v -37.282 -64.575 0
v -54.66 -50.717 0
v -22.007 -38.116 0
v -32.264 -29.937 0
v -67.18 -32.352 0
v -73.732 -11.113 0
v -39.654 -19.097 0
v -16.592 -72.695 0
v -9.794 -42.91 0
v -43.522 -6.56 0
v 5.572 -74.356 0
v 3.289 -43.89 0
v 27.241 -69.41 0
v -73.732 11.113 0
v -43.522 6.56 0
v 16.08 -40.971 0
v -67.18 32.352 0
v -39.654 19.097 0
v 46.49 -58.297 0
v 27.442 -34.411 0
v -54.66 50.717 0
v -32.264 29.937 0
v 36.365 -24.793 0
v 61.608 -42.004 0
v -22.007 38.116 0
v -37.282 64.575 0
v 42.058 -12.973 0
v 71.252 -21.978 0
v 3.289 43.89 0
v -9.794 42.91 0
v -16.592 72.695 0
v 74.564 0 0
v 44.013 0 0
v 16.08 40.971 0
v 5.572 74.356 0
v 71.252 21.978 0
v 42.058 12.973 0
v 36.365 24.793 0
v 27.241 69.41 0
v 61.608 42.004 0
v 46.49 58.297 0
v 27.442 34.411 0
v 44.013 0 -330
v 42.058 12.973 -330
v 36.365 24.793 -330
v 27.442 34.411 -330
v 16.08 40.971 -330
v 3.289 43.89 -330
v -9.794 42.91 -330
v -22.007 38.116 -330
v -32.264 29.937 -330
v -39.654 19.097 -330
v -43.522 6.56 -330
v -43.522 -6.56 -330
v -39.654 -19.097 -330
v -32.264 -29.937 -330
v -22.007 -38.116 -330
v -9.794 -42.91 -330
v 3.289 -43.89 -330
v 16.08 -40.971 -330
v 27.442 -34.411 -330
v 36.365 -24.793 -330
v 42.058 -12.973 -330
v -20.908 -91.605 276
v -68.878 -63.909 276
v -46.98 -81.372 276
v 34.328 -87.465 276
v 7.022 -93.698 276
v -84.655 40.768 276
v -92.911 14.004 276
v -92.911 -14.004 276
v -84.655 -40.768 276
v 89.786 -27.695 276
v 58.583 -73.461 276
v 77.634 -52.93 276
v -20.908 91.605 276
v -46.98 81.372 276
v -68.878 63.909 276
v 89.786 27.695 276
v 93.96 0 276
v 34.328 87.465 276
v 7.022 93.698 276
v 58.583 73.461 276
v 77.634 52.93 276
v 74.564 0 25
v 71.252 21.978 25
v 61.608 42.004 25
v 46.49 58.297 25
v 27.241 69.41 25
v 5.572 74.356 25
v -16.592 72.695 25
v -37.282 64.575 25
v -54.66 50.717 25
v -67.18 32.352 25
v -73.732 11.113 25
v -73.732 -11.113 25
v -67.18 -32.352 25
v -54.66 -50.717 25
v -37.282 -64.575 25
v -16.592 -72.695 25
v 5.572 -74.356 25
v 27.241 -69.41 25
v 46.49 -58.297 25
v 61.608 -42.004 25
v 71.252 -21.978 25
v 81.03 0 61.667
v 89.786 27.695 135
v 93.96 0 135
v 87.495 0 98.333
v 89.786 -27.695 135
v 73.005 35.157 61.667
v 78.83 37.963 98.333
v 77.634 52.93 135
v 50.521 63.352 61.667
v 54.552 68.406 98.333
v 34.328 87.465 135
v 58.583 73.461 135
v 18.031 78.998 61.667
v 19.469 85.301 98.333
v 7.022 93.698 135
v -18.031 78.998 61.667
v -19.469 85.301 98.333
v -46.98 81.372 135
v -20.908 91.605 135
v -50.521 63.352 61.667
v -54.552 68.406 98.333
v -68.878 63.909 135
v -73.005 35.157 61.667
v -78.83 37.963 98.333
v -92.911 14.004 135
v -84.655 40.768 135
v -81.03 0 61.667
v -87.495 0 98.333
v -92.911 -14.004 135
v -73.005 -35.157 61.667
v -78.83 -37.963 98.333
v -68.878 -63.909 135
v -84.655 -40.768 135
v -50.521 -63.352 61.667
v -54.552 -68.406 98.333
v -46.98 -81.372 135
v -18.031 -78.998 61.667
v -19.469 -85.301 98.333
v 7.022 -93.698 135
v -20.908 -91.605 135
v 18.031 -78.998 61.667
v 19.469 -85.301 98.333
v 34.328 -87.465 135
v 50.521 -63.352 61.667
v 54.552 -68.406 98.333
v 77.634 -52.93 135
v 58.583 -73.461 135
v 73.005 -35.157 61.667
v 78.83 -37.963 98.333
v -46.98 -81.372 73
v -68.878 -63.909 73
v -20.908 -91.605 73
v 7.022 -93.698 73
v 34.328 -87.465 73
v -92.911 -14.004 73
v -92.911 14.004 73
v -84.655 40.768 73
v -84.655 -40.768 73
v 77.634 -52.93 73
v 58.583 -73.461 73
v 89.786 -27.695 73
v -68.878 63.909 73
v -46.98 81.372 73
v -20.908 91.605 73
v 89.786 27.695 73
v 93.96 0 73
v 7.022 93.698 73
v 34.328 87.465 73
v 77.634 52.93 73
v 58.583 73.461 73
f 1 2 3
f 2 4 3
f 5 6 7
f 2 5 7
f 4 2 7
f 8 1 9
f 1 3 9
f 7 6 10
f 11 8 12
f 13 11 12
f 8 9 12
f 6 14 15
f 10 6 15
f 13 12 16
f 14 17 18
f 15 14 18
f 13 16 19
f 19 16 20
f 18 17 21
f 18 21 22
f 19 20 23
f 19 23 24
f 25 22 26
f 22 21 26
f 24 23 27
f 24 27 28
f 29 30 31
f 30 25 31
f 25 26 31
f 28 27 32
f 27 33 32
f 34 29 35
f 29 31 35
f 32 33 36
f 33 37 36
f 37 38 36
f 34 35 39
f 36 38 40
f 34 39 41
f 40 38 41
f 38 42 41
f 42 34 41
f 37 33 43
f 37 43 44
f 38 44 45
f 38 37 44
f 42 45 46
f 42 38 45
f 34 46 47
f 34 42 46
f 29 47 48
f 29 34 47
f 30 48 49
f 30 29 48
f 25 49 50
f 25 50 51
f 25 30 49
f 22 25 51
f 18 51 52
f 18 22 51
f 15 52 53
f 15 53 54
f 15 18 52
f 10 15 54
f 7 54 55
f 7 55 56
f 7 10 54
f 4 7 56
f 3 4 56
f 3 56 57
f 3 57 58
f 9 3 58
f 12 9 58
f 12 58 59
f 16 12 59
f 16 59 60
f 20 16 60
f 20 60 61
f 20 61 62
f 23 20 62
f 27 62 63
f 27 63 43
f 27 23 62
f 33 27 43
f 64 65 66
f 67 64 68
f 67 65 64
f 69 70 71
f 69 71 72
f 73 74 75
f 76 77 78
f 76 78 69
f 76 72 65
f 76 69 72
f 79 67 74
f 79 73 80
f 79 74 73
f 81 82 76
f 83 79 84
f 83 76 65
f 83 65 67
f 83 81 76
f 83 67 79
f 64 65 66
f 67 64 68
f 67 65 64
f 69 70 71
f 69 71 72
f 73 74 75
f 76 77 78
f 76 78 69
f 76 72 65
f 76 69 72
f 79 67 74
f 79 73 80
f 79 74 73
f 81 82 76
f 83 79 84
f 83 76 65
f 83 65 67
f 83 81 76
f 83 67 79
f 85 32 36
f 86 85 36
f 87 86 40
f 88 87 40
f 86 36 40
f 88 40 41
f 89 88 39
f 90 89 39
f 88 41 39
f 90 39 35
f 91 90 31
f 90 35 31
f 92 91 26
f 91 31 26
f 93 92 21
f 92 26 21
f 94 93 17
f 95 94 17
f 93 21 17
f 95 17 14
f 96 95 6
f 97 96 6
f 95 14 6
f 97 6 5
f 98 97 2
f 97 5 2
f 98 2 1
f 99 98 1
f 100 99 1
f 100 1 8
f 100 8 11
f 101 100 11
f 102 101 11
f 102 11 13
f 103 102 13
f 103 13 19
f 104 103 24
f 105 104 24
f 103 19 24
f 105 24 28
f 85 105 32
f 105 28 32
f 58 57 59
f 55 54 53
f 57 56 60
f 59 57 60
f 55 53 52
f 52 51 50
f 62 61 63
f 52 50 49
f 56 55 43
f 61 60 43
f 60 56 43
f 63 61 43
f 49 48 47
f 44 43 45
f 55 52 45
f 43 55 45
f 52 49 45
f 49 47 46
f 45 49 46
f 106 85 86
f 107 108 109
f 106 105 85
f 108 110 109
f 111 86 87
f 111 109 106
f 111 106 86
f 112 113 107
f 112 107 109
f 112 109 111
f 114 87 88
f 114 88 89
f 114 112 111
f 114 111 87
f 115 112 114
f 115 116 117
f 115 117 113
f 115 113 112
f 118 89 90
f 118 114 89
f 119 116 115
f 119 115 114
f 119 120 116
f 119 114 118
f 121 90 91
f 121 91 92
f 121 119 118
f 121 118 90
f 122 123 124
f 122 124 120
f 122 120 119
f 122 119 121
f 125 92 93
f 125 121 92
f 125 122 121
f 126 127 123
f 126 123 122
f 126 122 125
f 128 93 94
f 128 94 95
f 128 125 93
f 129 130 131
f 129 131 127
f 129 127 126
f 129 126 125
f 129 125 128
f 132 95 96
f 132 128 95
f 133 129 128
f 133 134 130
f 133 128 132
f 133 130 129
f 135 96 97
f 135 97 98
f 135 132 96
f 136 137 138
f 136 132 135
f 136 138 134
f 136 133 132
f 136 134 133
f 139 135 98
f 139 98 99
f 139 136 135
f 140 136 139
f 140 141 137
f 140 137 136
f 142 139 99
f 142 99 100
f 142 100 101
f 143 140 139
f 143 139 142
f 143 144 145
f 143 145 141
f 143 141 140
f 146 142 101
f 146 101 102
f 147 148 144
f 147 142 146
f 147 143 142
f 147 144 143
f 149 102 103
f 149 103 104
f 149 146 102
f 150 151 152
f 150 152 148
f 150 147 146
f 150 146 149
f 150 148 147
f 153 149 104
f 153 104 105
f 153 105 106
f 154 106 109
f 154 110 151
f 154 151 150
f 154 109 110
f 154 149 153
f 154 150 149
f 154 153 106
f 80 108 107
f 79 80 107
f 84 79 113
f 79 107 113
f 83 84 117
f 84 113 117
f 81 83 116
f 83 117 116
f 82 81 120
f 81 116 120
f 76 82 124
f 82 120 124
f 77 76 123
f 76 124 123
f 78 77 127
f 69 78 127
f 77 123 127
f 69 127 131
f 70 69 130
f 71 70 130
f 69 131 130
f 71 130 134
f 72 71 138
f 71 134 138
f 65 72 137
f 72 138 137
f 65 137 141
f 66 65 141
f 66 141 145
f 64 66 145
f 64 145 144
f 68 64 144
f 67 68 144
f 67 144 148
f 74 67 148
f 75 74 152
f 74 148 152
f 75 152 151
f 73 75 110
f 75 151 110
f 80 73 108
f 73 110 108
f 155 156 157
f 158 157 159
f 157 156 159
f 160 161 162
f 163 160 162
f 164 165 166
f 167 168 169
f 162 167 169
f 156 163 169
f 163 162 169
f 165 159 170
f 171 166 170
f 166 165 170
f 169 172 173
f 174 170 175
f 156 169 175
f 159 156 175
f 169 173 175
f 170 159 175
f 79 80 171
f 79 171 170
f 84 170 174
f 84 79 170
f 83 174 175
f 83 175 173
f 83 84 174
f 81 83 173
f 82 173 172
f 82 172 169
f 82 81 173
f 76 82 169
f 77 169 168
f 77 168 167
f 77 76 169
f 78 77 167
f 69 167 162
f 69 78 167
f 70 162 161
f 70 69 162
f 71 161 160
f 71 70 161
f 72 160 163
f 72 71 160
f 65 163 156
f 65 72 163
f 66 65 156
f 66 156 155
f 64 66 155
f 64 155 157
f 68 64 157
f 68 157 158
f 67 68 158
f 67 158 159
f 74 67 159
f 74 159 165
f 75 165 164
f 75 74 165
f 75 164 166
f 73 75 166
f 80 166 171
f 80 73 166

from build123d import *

# Parameters (mm, degrees)
F0_R      = 74.5643823595
F1_DEPTH  = 25
F1_FACE_R = 74.5643823595
F2_DEPTH  = 110
F2_TAPER  = -10
F3_R      = 57.2567690905
F2_FACE_R = 93.9603502375
F4_DEPTH  = 141
F5_R      = 44.0131368503
F6_DEPTH  = 330
F7_DEPTH  = 203


# Not quite as in the source:
# - a feature names something its author has since deleted; it is built from what else it names


with BuildPart() as f1:
    # F0 (on Top) → F1 (new body)
    with BuildSketch(Plane.XY):
        Circle(F0_R)
    extrude(amount=F1_DEPTH)

    # F1_face (on face) → F2 (join)
    with BuildSketch(Plane.XY.offset(25)):
        Circle(F1_FACE_R)
    extrude(amount=F2_DEPTH, taper=F2_TAPER)

    # F3 (on Top) + F2_face (on face) → F4 (join)
    with BuildSketch(Plane.XY):
        Circle(F3_R)
    with BuildSketch(Plane.XY.offset(135)):
        Circle(F2_FACE_R)
    extrude(amount=F4_DEPTH)

    # F5 (on Top) → F6 (join)
    with BuildSketch(Plane.XY):
        Circle(F5_R)
    extrude(amount=-F6_DEPTH)


with BuildPart() as f7:
    # F7 (new): a face of the model
    f7_faces = [f1.part.faces().sort_by_distance(p)[0] for p in [
        (0, 0, 276),
    ]]
    extrude(f7_faces, amount=-F7_DEPTH)


solid = Compound([f1.part, f7.part])
